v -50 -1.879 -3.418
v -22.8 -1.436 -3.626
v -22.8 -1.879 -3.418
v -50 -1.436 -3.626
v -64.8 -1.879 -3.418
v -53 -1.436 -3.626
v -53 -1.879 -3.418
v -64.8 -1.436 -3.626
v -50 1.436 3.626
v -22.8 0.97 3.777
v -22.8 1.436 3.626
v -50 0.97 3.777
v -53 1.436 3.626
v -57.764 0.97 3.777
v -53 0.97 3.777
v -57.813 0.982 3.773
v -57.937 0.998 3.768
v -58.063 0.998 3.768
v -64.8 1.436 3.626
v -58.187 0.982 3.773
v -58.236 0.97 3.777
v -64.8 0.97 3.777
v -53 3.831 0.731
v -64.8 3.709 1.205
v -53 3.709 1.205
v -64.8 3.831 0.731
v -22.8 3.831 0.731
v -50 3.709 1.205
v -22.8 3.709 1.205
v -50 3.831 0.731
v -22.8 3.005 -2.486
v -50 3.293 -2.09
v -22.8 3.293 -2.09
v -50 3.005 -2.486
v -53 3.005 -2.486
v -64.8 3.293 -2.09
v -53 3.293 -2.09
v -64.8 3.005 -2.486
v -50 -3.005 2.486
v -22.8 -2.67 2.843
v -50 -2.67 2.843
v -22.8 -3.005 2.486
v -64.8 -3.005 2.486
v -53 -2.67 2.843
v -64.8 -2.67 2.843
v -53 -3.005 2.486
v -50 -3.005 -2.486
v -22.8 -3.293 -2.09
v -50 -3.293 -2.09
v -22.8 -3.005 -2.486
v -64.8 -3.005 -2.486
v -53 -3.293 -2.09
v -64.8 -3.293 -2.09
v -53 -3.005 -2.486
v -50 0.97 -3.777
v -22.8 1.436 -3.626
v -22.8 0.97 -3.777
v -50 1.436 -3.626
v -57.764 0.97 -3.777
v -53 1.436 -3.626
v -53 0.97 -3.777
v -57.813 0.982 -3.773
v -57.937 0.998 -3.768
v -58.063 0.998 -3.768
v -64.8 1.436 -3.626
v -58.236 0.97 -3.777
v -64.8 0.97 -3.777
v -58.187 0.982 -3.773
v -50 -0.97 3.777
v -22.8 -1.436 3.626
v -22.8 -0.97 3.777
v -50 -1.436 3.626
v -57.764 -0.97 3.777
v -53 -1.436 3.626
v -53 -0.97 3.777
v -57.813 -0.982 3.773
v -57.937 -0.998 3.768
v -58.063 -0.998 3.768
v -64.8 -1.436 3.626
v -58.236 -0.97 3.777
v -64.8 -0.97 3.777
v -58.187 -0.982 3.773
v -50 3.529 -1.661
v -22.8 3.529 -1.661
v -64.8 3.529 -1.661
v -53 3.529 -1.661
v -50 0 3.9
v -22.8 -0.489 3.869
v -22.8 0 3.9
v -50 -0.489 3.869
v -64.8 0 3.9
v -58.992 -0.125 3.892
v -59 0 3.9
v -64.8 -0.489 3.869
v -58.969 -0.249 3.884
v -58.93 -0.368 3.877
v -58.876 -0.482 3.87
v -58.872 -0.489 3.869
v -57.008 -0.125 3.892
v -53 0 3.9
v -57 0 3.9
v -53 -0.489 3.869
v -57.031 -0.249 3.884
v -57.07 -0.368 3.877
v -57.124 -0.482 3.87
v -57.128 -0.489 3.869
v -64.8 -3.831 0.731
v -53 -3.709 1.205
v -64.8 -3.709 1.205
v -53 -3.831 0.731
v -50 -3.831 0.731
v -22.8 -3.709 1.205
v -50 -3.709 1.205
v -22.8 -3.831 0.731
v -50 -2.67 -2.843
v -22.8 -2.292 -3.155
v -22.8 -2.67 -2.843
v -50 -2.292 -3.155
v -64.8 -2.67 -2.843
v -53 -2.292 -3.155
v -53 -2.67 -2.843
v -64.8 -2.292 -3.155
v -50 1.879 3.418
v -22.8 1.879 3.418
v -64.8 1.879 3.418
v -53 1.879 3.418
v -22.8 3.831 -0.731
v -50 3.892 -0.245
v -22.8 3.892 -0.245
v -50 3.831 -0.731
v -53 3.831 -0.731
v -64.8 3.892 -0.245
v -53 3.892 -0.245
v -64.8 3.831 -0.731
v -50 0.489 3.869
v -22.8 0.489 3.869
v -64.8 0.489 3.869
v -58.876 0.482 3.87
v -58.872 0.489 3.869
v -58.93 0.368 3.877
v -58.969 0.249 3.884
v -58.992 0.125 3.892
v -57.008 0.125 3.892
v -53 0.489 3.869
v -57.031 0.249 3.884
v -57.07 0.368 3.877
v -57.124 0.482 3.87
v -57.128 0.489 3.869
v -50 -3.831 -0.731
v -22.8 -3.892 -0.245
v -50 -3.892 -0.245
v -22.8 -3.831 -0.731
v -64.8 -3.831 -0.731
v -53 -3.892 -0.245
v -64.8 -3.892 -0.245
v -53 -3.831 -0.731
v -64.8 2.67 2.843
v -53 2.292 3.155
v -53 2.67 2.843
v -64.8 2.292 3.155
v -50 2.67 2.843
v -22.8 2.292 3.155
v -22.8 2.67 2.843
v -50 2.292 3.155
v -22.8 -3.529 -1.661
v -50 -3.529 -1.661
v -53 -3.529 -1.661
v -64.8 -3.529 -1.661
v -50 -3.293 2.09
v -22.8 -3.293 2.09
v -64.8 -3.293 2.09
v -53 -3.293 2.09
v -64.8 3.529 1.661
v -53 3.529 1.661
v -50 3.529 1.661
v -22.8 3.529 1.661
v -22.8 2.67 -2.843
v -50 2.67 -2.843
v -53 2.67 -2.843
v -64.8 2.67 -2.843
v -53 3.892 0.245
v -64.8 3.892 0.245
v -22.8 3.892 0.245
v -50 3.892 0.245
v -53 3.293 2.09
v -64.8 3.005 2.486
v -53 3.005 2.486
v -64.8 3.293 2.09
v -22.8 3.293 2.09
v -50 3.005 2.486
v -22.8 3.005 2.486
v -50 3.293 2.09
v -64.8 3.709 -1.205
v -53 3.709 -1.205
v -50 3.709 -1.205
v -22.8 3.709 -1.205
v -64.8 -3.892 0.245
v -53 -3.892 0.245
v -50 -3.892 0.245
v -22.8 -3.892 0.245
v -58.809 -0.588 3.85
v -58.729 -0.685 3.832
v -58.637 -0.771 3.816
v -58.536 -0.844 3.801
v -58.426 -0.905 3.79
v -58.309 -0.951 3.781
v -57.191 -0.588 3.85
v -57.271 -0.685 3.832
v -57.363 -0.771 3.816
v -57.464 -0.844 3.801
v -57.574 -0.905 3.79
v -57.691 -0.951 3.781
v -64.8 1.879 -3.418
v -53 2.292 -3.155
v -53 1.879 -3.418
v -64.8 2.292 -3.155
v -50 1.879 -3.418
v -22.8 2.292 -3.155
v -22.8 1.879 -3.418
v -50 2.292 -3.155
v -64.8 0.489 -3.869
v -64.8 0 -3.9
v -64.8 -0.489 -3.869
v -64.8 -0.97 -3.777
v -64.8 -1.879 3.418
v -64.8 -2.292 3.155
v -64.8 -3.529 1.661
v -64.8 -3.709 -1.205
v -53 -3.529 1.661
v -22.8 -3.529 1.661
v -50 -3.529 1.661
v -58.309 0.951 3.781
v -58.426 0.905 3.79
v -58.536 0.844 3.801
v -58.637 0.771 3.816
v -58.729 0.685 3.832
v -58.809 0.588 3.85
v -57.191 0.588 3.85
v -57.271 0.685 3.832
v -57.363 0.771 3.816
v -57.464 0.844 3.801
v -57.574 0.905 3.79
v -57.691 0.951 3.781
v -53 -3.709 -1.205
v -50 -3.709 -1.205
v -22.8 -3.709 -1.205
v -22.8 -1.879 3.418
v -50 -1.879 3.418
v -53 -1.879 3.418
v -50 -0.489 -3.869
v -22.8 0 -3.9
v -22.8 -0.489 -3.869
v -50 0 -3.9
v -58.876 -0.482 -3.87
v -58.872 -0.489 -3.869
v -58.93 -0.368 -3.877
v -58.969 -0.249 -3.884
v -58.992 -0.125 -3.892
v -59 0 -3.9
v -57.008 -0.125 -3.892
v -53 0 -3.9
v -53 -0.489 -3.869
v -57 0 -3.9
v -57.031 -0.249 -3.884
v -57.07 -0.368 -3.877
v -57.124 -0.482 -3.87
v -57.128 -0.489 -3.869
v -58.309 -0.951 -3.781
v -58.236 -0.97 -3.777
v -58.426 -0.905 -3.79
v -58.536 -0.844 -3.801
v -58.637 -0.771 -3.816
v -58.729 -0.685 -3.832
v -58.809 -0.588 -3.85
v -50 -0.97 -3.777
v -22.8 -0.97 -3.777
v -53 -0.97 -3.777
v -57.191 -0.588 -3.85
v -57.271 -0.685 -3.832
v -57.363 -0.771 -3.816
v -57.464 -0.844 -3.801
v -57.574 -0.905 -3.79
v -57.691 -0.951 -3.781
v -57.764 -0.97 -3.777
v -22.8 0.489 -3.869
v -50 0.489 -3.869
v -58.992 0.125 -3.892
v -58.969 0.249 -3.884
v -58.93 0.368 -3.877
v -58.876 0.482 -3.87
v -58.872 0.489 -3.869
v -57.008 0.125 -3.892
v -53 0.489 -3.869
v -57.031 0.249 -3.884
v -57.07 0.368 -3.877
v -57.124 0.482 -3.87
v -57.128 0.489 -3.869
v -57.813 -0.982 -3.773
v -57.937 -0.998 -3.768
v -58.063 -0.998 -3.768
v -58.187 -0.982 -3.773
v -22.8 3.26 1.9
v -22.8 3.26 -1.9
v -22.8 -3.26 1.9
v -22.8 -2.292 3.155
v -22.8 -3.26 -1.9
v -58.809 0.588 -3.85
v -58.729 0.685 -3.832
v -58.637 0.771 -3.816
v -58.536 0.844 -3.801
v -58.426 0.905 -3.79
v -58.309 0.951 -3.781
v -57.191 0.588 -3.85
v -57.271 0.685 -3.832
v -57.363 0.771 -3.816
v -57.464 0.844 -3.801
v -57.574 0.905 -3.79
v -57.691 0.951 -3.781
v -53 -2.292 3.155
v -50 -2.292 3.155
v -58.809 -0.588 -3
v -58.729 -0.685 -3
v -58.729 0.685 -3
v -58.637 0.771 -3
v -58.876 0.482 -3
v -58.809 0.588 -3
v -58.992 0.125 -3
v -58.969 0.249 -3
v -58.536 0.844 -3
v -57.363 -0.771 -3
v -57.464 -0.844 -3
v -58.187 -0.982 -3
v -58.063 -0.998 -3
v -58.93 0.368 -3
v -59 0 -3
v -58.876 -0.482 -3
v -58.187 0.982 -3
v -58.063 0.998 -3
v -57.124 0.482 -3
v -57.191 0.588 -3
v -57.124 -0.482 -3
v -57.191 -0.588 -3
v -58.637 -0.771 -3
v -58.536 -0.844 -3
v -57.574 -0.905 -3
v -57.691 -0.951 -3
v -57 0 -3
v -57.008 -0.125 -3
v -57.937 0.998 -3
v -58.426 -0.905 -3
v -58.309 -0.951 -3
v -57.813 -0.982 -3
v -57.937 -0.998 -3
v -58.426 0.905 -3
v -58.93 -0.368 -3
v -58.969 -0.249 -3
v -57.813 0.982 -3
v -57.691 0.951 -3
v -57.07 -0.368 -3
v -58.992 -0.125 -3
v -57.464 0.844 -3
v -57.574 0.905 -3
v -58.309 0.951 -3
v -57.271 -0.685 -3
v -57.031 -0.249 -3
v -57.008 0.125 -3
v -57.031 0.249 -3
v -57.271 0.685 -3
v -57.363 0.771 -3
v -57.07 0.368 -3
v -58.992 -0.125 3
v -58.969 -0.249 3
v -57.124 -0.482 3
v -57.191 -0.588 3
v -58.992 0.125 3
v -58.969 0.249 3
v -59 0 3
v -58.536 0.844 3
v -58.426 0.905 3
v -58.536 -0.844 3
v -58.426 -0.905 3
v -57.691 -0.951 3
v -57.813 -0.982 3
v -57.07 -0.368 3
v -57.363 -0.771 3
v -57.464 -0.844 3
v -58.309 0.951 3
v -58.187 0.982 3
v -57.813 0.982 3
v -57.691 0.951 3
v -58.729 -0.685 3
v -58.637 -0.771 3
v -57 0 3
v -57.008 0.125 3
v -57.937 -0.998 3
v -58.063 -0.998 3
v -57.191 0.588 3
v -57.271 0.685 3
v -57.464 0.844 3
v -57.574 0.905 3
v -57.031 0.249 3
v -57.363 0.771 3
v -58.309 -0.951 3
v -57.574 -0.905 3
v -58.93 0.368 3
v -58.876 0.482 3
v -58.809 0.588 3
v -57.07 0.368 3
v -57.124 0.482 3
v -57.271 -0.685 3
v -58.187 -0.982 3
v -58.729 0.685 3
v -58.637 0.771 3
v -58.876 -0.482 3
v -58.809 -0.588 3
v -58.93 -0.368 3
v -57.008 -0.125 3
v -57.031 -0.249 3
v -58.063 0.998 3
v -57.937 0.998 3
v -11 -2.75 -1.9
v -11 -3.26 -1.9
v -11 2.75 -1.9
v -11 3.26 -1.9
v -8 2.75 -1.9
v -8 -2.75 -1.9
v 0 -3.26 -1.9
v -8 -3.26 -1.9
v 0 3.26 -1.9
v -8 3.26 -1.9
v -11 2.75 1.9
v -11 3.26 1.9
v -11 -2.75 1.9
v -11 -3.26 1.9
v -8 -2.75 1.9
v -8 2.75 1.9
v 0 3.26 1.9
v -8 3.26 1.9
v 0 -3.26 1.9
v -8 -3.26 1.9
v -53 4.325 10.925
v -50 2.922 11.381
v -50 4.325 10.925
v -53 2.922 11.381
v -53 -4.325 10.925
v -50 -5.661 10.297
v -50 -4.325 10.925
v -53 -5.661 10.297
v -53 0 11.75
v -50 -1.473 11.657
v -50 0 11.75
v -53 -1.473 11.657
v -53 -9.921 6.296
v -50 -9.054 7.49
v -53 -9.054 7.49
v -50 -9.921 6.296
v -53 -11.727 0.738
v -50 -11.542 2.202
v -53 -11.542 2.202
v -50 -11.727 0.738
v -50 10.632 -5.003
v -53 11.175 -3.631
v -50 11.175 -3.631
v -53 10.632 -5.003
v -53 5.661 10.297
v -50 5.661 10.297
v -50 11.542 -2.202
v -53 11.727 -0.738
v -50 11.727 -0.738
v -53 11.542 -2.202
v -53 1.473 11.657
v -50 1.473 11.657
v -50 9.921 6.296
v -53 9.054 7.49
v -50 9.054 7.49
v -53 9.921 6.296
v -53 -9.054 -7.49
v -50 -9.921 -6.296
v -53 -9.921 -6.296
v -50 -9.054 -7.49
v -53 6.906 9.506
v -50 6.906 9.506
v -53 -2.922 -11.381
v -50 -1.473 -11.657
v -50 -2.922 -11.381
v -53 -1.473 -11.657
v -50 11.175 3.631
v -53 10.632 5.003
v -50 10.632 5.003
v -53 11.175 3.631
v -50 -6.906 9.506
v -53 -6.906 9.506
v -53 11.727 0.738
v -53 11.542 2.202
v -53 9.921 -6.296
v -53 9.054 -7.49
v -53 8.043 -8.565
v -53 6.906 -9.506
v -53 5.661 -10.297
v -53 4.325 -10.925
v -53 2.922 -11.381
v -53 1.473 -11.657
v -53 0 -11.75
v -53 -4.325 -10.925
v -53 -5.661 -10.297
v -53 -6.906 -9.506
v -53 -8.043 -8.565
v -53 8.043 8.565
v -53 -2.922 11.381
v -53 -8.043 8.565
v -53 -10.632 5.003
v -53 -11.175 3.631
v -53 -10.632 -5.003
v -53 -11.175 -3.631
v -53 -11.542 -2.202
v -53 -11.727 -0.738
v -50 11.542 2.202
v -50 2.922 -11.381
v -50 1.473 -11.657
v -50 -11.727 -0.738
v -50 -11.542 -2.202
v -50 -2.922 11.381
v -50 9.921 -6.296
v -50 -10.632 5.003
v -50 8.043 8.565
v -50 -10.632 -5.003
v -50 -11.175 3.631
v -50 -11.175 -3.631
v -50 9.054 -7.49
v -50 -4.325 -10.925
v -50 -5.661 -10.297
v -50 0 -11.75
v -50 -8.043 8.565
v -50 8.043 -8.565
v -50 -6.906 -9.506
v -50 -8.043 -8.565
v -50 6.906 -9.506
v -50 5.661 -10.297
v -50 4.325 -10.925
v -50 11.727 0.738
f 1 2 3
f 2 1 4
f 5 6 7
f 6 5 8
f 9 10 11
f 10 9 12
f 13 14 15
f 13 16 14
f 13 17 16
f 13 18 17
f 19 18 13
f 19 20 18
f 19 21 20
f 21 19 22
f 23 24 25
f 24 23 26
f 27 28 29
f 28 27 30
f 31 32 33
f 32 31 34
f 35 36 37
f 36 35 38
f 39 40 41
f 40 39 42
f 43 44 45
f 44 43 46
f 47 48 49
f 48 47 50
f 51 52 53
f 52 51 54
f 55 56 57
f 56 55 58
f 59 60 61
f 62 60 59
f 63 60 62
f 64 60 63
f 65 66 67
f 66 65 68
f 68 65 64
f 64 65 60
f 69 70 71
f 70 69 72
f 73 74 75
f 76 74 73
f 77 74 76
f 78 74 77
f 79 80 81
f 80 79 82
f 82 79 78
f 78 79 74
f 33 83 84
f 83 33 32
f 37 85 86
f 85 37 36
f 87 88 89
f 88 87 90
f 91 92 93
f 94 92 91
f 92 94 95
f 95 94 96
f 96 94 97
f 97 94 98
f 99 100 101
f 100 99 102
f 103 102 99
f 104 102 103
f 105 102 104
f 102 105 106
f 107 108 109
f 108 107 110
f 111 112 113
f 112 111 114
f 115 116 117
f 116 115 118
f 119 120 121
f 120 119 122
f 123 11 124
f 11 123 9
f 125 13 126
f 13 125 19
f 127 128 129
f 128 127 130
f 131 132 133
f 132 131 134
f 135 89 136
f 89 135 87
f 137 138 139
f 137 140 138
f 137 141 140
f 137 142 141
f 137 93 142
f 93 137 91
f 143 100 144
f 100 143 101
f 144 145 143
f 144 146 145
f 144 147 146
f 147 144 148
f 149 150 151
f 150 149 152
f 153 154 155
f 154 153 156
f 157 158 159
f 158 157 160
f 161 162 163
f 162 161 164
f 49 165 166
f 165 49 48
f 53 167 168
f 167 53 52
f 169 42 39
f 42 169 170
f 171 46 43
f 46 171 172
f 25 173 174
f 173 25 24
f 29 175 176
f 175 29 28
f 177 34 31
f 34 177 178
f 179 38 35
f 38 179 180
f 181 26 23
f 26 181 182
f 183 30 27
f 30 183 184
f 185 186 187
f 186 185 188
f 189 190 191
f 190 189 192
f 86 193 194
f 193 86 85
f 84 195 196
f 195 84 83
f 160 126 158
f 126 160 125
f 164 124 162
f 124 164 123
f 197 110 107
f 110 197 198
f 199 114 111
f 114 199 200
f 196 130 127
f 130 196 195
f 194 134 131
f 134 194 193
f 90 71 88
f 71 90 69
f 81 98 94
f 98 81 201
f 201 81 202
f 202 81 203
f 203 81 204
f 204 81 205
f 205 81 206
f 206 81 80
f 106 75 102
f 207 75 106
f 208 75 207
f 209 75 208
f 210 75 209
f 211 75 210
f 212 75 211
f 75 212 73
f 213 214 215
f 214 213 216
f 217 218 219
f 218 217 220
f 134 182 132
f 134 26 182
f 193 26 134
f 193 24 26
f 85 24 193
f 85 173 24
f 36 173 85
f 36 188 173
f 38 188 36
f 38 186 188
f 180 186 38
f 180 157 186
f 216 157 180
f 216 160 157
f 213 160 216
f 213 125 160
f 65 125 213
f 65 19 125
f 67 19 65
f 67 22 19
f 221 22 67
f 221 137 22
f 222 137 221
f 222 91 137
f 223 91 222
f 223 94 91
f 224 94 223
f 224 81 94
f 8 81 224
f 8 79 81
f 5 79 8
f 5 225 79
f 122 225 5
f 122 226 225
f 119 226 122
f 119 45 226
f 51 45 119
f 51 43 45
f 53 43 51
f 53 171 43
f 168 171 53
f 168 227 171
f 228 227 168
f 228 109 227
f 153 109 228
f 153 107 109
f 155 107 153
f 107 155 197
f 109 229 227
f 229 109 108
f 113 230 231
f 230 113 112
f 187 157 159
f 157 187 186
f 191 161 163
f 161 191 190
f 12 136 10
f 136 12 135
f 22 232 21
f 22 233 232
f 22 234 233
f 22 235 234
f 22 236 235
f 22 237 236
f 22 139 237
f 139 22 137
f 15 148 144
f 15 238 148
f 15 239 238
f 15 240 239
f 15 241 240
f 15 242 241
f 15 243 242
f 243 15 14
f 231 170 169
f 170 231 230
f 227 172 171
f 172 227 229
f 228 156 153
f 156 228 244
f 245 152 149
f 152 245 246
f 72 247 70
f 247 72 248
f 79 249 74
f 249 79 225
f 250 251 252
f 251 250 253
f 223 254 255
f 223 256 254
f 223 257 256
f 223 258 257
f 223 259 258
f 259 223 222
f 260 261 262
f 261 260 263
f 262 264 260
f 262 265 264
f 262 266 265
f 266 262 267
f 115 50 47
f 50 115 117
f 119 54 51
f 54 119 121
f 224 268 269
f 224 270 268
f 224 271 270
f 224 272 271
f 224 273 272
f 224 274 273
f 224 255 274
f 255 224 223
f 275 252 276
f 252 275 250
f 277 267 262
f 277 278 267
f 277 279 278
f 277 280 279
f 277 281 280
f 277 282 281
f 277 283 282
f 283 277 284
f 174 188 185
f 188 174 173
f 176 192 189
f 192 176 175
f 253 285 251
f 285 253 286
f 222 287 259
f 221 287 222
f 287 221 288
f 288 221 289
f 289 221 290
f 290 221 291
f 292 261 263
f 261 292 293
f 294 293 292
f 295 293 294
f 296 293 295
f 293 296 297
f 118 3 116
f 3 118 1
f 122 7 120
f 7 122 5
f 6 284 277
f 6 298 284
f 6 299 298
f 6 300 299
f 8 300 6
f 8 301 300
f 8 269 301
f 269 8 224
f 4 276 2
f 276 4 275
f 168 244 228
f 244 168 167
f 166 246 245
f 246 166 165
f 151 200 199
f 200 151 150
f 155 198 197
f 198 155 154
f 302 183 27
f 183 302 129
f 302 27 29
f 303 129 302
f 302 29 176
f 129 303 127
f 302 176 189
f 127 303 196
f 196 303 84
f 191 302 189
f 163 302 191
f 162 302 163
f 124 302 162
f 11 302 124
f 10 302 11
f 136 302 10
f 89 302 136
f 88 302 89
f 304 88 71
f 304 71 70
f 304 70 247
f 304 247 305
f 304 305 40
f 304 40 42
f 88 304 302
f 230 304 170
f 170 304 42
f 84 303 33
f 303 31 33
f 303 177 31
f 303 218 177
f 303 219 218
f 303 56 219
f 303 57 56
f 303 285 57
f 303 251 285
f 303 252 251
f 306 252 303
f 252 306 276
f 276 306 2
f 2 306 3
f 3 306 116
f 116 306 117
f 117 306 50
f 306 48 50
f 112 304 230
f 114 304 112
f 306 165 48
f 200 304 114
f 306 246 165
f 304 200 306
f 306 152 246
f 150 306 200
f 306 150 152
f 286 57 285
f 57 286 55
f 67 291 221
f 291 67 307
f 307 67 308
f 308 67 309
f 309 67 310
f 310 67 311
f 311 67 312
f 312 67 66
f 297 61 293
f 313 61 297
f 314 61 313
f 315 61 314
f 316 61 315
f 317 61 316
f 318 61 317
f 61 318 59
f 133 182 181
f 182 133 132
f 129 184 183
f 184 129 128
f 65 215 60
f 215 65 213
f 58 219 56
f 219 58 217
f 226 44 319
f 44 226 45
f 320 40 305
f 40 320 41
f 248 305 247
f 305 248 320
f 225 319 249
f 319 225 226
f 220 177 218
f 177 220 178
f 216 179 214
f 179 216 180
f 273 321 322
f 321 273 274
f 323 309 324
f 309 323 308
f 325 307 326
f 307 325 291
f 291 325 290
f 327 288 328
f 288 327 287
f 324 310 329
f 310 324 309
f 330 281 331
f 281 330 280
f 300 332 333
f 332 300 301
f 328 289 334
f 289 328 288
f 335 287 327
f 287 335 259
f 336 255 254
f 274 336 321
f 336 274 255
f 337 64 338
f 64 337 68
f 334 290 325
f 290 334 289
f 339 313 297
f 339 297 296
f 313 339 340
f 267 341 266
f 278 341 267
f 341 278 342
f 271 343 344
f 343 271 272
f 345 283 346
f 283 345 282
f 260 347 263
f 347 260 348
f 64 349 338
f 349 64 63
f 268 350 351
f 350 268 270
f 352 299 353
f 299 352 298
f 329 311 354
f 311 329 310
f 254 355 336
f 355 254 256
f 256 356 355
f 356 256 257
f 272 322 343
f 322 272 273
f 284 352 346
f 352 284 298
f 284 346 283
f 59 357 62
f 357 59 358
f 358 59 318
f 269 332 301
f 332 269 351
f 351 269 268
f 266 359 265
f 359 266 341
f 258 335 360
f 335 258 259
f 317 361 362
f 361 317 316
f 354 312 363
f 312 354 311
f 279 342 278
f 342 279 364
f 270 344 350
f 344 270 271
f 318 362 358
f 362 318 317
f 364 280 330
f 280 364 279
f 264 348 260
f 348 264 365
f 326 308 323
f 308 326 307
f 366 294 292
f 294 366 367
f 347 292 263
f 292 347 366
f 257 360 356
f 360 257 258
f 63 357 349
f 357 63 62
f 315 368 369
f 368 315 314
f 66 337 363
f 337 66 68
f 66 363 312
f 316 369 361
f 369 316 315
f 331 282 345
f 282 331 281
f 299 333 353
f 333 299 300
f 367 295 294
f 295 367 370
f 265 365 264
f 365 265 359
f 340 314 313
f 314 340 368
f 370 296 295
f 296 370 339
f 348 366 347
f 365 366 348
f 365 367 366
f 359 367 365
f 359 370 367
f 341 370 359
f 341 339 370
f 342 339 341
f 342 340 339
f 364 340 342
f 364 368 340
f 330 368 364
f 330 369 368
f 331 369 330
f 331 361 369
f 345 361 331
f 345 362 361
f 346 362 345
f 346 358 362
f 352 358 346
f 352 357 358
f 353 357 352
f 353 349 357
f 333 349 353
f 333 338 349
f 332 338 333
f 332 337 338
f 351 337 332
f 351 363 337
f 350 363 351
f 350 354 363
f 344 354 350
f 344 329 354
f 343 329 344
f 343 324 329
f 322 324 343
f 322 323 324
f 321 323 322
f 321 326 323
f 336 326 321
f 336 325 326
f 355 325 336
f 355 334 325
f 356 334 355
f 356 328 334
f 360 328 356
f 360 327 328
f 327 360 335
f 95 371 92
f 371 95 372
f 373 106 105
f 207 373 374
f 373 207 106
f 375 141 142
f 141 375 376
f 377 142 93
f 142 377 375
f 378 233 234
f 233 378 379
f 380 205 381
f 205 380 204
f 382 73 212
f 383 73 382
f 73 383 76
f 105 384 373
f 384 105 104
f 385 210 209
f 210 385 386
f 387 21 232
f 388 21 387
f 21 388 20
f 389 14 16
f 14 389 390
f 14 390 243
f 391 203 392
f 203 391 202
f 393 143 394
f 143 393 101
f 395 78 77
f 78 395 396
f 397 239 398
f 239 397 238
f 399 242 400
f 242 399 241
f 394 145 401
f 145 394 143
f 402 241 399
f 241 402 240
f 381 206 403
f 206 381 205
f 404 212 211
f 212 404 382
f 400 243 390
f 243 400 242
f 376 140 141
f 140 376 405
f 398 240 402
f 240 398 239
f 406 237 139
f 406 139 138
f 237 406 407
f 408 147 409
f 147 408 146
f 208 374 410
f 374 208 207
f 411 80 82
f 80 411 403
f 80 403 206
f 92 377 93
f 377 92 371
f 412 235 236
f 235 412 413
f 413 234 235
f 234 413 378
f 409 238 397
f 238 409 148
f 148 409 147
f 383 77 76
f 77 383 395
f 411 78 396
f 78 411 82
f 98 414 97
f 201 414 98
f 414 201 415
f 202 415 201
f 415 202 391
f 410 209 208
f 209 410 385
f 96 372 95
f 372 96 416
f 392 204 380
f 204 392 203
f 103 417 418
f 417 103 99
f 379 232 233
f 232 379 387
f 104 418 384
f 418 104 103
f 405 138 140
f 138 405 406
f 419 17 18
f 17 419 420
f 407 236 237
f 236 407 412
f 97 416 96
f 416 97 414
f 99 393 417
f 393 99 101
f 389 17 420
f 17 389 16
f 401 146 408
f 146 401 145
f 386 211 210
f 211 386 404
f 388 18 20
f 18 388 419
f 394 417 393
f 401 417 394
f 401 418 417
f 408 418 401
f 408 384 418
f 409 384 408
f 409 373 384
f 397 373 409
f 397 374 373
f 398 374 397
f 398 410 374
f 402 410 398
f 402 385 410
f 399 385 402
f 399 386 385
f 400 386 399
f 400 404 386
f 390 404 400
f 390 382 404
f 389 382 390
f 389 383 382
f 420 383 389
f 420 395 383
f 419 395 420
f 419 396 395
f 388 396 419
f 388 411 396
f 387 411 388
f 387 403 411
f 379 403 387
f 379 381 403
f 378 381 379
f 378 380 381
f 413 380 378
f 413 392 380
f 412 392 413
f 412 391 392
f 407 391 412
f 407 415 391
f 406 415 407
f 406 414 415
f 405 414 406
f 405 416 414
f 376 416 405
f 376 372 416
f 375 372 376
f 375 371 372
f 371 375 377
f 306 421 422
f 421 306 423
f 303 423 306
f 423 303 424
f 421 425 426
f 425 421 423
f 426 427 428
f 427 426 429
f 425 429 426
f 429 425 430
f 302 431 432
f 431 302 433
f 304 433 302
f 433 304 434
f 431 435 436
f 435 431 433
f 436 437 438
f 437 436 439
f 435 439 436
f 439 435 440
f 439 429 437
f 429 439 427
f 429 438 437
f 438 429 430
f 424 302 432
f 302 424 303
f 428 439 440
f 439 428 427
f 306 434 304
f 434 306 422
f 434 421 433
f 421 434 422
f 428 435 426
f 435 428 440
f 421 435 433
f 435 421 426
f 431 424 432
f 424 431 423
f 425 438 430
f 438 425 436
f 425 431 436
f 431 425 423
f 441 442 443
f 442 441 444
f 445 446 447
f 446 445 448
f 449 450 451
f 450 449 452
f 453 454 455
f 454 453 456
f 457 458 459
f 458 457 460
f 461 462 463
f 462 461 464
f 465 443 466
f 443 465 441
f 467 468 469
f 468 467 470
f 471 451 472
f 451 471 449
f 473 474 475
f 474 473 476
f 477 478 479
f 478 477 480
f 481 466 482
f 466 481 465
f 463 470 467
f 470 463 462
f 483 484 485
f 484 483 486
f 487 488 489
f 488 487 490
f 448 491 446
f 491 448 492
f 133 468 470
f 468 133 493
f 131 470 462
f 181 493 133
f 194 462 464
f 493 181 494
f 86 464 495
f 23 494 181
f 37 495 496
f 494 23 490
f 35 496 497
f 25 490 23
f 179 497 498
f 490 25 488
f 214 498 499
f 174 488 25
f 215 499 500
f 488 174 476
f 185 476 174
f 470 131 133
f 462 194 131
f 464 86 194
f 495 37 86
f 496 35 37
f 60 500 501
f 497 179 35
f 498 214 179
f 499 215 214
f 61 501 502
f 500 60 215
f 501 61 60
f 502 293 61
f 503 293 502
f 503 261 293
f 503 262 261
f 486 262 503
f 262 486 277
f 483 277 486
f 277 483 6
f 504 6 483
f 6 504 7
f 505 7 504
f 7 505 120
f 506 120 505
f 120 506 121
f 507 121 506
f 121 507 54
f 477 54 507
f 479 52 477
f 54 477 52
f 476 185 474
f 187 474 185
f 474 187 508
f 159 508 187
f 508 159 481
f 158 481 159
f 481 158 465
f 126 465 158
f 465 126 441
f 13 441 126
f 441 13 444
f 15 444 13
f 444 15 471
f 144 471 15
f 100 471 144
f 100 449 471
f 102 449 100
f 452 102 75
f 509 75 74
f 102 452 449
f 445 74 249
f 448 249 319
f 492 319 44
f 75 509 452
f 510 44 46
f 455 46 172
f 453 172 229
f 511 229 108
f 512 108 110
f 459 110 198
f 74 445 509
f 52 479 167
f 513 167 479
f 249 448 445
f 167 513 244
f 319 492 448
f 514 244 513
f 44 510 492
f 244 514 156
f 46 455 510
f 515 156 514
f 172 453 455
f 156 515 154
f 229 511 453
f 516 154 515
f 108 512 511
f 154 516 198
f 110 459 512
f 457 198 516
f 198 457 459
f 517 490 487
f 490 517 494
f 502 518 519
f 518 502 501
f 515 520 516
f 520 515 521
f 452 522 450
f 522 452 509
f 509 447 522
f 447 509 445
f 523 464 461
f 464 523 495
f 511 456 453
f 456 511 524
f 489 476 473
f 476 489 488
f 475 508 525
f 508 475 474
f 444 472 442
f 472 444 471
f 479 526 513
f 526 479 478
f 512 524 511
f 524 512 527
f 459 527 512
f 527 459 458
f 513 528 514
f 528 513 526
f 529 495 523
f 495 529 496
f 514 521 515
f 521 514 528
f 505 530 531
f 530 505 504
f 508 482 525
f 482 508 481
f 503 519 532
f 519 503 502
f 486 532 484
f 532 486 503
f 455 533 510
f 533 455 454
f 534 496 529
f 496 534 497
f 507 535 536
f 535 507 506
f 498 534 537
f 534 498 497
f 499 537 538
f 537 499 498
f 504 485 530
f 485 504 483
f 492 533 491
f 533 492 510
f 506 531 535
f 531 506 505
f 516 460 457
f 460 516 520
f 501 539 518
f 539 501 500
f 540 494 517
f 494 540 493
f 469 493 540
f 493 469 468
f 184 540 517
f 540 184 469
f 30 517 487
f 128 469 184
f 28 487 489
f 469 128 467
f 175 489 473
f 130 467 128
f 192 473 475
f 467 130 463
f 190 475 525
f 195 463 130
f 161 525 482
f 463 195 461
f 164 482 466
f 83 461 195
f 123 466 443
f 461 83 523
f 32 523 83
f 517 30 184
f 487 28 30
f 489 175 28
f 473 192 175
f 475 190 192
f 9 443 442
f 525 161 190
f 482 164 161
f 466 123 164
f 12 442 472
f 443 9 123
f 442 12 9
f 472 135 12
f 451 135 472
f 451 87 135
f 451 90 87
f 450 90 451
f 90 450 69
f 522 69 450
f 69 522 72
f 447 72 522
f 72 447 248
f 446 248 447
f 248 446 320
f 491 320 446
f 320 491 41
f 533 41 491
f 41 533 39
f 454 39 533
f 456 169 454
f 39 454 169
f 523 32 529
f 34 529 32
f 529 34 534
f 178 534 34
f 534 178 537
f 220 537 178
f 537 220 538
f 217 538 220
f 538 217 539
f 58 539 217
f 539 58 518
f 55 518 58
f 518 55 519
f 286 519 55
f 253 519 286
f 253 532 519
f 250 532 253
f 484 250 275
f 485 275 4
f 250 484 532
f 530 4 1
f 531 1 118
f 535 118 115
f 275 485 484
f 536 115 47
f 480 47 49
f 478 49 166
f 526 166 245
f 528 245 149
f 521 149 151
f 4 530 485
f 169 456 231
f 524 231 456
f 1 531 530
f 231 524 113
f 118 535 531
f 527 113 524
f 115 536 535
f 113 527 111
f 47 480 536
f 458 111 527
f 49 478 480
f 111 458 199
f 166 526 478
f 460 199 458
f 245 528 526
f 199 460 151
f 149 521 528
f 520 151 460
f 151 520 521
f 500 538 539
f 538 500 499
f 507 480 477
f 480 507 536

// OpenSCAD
// file: ../robot_settings.scad
main_box_x = 100; // 96
main_box_y = 102;
main_box_z = 74; // 74.5

lfp_main_box_x = 65;
lfp_main_box_y = 152;
lfp_main_box_z = 94;

wall_thickness = 5;

rail_gap = 2;
rail_inset = 7;

rail_thickness = 7;
rail_length = 250;
rail_width = 260;

lfp_battery_width = 65.5;
lfp_battery_depth = 150.5;
lfp_battery_height = 93;
lfp_battery_midterrace_width = 64.8;
lfp_battery_midterrace_depth = 150.2;
lfp_battery_midterrace_height = 7.8;
lfp_battery_topterrace_width = 62.8;
lfp_battery_topterrace_depth = 149.4;
lfp_battery_topterrace_height = 6.6;

// red right
// black left
lfp_battery_terminal_width = 9.2;
lfp_battery_terminal_depth = 9.5;
lfp_battery_terminal_depth_setback = 4.4;
lfp_battery_terminal_width_setback = 5.9;

raspberry_pi_screw_seperation_y = 57;
raspberry_pi_screw_seperation_z = 48;
raspberry_pi_peg_h = 5;

battery_box_peg_h = 6;
battery_box_peg_d = 9.5;
battery_box_peg_cutout = 5;

gears_module = 1;
pinion_gear_teeth = 32;
pinion_gear_width = 5;
pinion_gear_bore = 8;

gears_setback_distance = 25;
gear_post_height = 2 * pinion_gear_width + rail_thickness + 8 ;

steering_motor_mount_x = 45;
steering_motor_mount_y = 36;
steering_motor_mount_z = 18;
steering_motor_mount_setback_distance = gears_setback_distance + 16;

cradle_wall_thickness = 5;
post_thickness_x_y = 10;
post_wallside_position_y = 12.5;
post_separation_y = 47.5;
post_x_position = 70; // width of cradle. this is proportional to rail_width.

imu_width = 26; // x is along the width axis
imu_depth = 16; // y is along the depth axes. +y points at pins.
imu_screw_d = 3;
imu_screw_corner_border = 1.27;
imu_underside_pin_h = 1; // z is along the h axis
imu_thickness = 1.6;
imu_left_edge_pins = 1.6;

dc_motor_drivertype = "Teyleten"; // Teyleten
isAdafruit = (dc_motor_drivertype == "Adafruit");

drv8871_x = isAdafruit ? 20.3 : 21.6;
drv8871_y = isAdafruit ?  24 : 25;

drv8871_z = 2;
drv8871_screw_d = 2.5;
drv8871_solder_points_z = 2;

drv8871mount_edge_x = 1.5;
drv8871mount_edge_wall = 3;
drv8871mount_z = 5;
drv8871mount_x = drv8871_x +  drv8871mount_edge_wall - 2* drv8871mount_edge_x;
drv8871mount_y = 19;

drv8871_screw_distance = 15.64;
drv8871_solder_points_d = 1.66;
drv8871_solder_offset_y = 4.4;
drv8871_solder_inner_points_distance = 5;
drv8871_solder_outer_points_distance = 12;

dc_motor_75_1_encoder_z = 14.75;
dc_motor_75_1_encoder_d = 24.5;
dc_motor_75_1_housing_z = 30;
dc_motor_75_1_housing_d = 24.1;
dc_motor_75_1_gearbox_z = 23;
dc_motor_75_1_gearbox_d = 24.8;
dc_motor_75_1_z = dc_motor_75_1_encoder_z + dc_motor_75_1_housing_z + dc_motor_75_1_gearbox_z;

dc_motor_housing_minus_encoder_z = 48;
dc_motor_encoder_z = 9.33;
dc_motor_encoder_wheel_d = 13.4;
dc_motor_encoder_wheel_thickness = 5;
dc_motor_encoder_wheel_gap = 3;
dc_motor_encoder_circuit_thickness = 2;
dc_motor_z = dc_motor_housing_minus_encoder_z + dc_motor_encoder_z + dc_motor_encoder_wheel_thickness + dc_motor_encoder_wheel_gap + dc_motor_encoder_circuit_thickness;
dc_motor_cutout_d = 24.8;
dc_motor_cutout_z = 19.5;


M3_shaft_d = 2.82;

dc_motor_screw_head_z = 2;
dc_motor_screw_head_d = 5.6;
dc_motor_screw_d = 3.2;
dc_motor_screw_offset = 8.5;

dc_motor_axle_ring_z = 3;
dc_motor_axle_ring_d = 7.2;
dc_motor_axle_cutout_d = 4.2;
dc_motor_axle_cutout_z = 10;
dc_motor_axle_notch_cutout = 0.4;
dc_motor_axle_notch_cutout_z = 6;

pdmount_x = 20;
pdmount_y = 30;
pdmount_z = 2;
pdmount_edge_x = 1.5;
pdmount_edge_wall = 3;

steering_shaft_z = 45;
steering_shaft_d = 7;
steering_shaft_motor_fitting_d = 9;
coupler_length = 24.6;
coupler_diameter = 14;
coupler_screw_d = 4;
coupler_screw_z_offset = 8.3;
coupler_gear_side_insert = 12.6;
steering_shaft_with_coupler_z = steering_shaft_z - coupler_gear_side_insert;

lidar_mount_y = 110;
lidar_mount_x = 65 + 20;
lidar_narrow_screws = 40;
lidar_wide_screws = 56;
lidar_front_to_back_screws = 70;
lidar_screw_d = 3;
lidar_circuitboard_x = 20;
lidar_circuitboard_y = 35;
lidar_circuitboard_z = 1.2;
lidar_cord_length = 29;

ball_bearing_height = 7;
ball_bearing_outer_diameter = 22;
ball_bearing_inner_diameter = 8;

M4_diameter = 5.1;
M3_diameter = 2.9;
M3_length = 35;
M3_cap_length= 3;
M3_cap_diameter = 5.44;

suspension_spring_outer_diameter = 8;
suspension_spring_inner_diameter = 5.3;

armature_holder_height = 20;
armature_holder_thickness = 8;
pull_bar_peg_r = 3.2;
apparatus_locking_peg_d = 4;

rack_module = 1;
rack_length = main_box_x;
rack_height = 5;
rack_width = 10;
rack_teeth = 30;
rack_bore = 3;

pull_bar_length = rail_width / 2 - rack_length + 1;

// tire hardware
axle_length = 42.0; 
axle_reciever_inner_diameter = ball_bearing_inner_diameter;
axle_reciever_outer_diameter = 12;
axle_reciever_length = 18.8;
axle_notch_length = 15;
axle_notch_cutout = 2.4;

// power distribution bar
power_bar_cutout_x = 96;
power_bar_y = 19.1;
power_bar_z = 1.5;
power_bar_screw_distance = 91.4;
power_bar_screw_d = 2.8;
power_bar_standoff_z = 5;
power_bar_standoff_d = 6.83;

pico_expander_width = 63;
pico_expander_height = 57;
pico_screw_hole_offset = 3;
pico_screw_hole_d = 2.5;

usbhub_thickness = 11.7;
usbhub_depth = 37.5;
usbhub_width = 86.7;
usbhub_end_port_width = 14.8;
usbhub_end_port_height = 12;
usbhub_front_face_safe_zone_left = 15;
usbhub_front_face_safe_zone_right = 14.8;

switch_w = 16;
switch_cutout_d = 12.2;
switch_bump_h = 2;
switch_bump_l = 18.2;

i2c_mount_thickness = 3;
i2c_w = 28;
i2c_l = 28;
i2c_circuitboard_thickness = 1.23;
i2c_bottom_notch_w = 14.35;
i2c_bottom_notch_depth = 1;
i2c_screw_hole_d = 1.9;
i2c_screw_hole_offset = 1.4;
i2c_pin_l = 11;
i2c_pin_d = 0.8;
i2c_pin_offset = 1.5;
i2c_pin_separation = 2.5;
i2c_all_pins_l = 8.3;
i2c_screen_thickness = 1.88;
i2c_screen_w = 14.6;
i2c_screen_d = 27;
i2c_screen_offset = 4.1;
// main file
include <../robot_settings.scad>

$fn=50;

module axle(
  axle_length = axle_length,
  axle_inner_radius = (axle_reciever_inner_diameter) / 2,
  rotate = true,
  rear_axle = false,
  show_axle = true,
  show_clip = false
)
{  
   rotation = rotate ? 180 : 0;
      
  rotate([0,rotation,0])
  {  
    if (show_axle) {
          // inner axle
          difference() {
              // axle
              color("red")
              translate([axle_notch_length + 8 -.2, 0, 0])
             rotate([0,90,0])
             cylinder(axle_length, d = axle_reciever_inner_diameter - .2); 


             // notch for coupler screw
             translate([axle_length + axle_notch_length + 1, 0,4])
             color("green")
             cylinder(coupler_screw_d/2, center = true);

             // notch for coupler screw
             translate([axle_length + axle_notch_length + 1,0,-4])
             color("blue")
             cylinder(coupler_screw_d/2, center = true);
          }

             
          difference() {
            // tire insert part of axle
            color("green")
            translate([axle_notch_length - 3.5, 0,  0 ])
            cube([axle_notch_length + 8, axle_reciever_inner_diameter - 1.48, 3.8], center = true);

            // notches for a clip
            translate([9.5, -axle_inner_radius, 0])
            cube([3, 2.5, 10], center = true);
            
            translate([9.5, axle_inner_radius, 0])
            cube([3, 2.5, 10], center = true);
          }
                  
          // axle cap
          translate([axle_length + 8, 0, 0])
           rotate([0,90,0])
            cylinder(h = 3, d = ball_bearing_outer_diameter + 1.5);
       }
          
        // clip
        if (show_clip) {
              translate([9.5, 0, -axle_inner_radius + .7])
              cube([2, 8, 2], center = true);
              
               translate([9.5, -axle_inner_radius + .5, 0])
              cube([2, 2, 8.7], center = true);
              
              translate([9.5, axle_inner_radius- .5, 0])
              cube([2, 2,8.7], center = true);
              
              translate([8.5, -axle_inner_radius + 1.6, 3.4])
              rotate([90, 0, 90])
              cylinder(2, d = 1.9);
              
              translate([8.5, axle_inner_radius - 1.5, 3.4])
              rotate([90, 0, 90])
              cylinder(2, d = 1.9);
         }
    }
}
 
axle();
